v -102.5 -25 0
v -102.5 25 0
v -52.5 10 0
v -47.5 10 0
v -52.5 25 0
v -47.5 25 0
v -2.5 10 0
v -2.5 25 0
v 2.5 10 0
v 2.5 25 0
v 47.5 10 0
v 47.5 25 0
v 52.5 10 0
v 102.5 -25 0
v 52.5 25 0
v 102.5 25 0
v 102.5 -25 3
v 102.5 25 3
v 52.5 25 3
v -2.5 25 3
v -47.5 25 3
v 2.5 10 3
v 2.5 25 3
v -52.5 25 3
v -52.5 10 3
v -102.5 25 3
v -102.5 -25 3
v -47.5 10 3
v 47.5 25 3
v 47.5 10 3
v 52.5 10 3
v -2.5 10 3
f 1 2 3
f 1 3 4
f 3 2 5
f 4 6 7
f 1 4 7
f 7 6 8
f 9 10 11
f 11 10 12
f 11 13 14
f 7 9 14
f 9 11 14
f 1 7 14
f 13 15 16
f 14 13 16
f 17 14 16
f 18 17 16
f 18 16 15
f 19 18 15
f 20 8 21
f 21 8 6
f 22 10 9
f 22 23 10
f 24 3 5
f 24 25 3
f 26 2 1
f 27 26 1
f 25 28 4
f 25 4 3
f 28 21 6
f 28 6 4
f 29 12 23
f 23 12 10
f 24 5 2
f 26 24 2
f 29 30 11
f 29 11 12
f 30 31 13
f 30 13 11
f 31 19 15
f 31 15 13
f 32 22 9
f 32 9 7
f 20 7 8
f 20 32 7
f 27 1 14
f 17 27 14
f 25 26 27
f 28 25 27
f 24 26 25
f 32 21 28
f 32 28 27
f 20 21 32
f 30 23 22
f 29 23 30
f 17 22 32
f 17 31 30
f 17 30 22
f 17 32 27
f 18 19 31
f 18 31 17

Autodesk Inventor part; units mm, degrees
ref_plane "YZ Plane" through (0, 0, 0) normal (1, 0, 0) x (0, 1, 0)
ref_plane "XZ Plane" through (0, 0, 0) normal (0, 1, 0) x (-1, 0, 0)
ref_plane "XY Plane" through (0, 0, 0) normal (0, 0, 1) x (1, 0, 0)
sketch "Sketch1" plane through (0, 0, 0) normal (0, 0, 1) x (1, 0, 0)
  line L0 (-102.5, -25) -> (102.5, -25)
  line L1 (102.5, -25) -> (102.5, 25)
  line L2 (102.5, 25) -> (-102.5, 25)
  line L3 (-102.5, 25) -> (-102.5, -25)
  line L4 (-102.5, -25) -> (102.5, 25) construction
  line L5 (102.5, -25) -> (-102.5, 25) construction
  point P0 (0, 0)
  dimension "d0" = 205
  dimension "d1" = 50
extrude "Plate1" add sketch "Sketch1" along normal blind 3
sketch "Sketch2" plane through (0, 0, 3) normal (0, 0, 1) x (1, 0, 0)
  line L0 (102.5, 25) -> (-102.5, 25) projected
  line L1 (47.5, 25) -> (52.5, 25)
  line L2 (52.5, 25) -> (52.5, 10)
  line L3 (52.5, 10) -> (47.5, 10)
  line L4 (47.5, 10) -> (47.5, 25)
  line L5 (102.5, 25) -> (102.5, -25) projected
  point P0 (0, 0)
  point P1 (52.5, 25)
  dimension "d3" = 50
  dimension "d4" = 5
  dimension "d5" = 15
extrude "Cut1" cut sketch "Sketch2" against normal blind 3
pattern_linear "Rectangular Pattern1" count 3 spacing 50 along (-1, 0, 0) of "Cut1"
equation "\"d6\" = Thickness"
equation "\"d2\" = Thickness"
equation "\"BendRadius\" = Thickness"
equation "\"BendReliefWidth\" = Thickness"
equation "\"BendReliefDepth\" = 0.5 * Thickness"
equation "\"CornerReliefSize\" = 4 * Thickness"
equation "\"MinimumRemnant\" = 2 * Thickness"
equation "\"TransitionRadius\" = BendRadius"
equation "\"JacobiRadiusSize\" = BendRadius"
equation "\"GapSize\" = Thickness"
equation "\"Thickness\" = 3"
properties part number "Sensors Shield"
